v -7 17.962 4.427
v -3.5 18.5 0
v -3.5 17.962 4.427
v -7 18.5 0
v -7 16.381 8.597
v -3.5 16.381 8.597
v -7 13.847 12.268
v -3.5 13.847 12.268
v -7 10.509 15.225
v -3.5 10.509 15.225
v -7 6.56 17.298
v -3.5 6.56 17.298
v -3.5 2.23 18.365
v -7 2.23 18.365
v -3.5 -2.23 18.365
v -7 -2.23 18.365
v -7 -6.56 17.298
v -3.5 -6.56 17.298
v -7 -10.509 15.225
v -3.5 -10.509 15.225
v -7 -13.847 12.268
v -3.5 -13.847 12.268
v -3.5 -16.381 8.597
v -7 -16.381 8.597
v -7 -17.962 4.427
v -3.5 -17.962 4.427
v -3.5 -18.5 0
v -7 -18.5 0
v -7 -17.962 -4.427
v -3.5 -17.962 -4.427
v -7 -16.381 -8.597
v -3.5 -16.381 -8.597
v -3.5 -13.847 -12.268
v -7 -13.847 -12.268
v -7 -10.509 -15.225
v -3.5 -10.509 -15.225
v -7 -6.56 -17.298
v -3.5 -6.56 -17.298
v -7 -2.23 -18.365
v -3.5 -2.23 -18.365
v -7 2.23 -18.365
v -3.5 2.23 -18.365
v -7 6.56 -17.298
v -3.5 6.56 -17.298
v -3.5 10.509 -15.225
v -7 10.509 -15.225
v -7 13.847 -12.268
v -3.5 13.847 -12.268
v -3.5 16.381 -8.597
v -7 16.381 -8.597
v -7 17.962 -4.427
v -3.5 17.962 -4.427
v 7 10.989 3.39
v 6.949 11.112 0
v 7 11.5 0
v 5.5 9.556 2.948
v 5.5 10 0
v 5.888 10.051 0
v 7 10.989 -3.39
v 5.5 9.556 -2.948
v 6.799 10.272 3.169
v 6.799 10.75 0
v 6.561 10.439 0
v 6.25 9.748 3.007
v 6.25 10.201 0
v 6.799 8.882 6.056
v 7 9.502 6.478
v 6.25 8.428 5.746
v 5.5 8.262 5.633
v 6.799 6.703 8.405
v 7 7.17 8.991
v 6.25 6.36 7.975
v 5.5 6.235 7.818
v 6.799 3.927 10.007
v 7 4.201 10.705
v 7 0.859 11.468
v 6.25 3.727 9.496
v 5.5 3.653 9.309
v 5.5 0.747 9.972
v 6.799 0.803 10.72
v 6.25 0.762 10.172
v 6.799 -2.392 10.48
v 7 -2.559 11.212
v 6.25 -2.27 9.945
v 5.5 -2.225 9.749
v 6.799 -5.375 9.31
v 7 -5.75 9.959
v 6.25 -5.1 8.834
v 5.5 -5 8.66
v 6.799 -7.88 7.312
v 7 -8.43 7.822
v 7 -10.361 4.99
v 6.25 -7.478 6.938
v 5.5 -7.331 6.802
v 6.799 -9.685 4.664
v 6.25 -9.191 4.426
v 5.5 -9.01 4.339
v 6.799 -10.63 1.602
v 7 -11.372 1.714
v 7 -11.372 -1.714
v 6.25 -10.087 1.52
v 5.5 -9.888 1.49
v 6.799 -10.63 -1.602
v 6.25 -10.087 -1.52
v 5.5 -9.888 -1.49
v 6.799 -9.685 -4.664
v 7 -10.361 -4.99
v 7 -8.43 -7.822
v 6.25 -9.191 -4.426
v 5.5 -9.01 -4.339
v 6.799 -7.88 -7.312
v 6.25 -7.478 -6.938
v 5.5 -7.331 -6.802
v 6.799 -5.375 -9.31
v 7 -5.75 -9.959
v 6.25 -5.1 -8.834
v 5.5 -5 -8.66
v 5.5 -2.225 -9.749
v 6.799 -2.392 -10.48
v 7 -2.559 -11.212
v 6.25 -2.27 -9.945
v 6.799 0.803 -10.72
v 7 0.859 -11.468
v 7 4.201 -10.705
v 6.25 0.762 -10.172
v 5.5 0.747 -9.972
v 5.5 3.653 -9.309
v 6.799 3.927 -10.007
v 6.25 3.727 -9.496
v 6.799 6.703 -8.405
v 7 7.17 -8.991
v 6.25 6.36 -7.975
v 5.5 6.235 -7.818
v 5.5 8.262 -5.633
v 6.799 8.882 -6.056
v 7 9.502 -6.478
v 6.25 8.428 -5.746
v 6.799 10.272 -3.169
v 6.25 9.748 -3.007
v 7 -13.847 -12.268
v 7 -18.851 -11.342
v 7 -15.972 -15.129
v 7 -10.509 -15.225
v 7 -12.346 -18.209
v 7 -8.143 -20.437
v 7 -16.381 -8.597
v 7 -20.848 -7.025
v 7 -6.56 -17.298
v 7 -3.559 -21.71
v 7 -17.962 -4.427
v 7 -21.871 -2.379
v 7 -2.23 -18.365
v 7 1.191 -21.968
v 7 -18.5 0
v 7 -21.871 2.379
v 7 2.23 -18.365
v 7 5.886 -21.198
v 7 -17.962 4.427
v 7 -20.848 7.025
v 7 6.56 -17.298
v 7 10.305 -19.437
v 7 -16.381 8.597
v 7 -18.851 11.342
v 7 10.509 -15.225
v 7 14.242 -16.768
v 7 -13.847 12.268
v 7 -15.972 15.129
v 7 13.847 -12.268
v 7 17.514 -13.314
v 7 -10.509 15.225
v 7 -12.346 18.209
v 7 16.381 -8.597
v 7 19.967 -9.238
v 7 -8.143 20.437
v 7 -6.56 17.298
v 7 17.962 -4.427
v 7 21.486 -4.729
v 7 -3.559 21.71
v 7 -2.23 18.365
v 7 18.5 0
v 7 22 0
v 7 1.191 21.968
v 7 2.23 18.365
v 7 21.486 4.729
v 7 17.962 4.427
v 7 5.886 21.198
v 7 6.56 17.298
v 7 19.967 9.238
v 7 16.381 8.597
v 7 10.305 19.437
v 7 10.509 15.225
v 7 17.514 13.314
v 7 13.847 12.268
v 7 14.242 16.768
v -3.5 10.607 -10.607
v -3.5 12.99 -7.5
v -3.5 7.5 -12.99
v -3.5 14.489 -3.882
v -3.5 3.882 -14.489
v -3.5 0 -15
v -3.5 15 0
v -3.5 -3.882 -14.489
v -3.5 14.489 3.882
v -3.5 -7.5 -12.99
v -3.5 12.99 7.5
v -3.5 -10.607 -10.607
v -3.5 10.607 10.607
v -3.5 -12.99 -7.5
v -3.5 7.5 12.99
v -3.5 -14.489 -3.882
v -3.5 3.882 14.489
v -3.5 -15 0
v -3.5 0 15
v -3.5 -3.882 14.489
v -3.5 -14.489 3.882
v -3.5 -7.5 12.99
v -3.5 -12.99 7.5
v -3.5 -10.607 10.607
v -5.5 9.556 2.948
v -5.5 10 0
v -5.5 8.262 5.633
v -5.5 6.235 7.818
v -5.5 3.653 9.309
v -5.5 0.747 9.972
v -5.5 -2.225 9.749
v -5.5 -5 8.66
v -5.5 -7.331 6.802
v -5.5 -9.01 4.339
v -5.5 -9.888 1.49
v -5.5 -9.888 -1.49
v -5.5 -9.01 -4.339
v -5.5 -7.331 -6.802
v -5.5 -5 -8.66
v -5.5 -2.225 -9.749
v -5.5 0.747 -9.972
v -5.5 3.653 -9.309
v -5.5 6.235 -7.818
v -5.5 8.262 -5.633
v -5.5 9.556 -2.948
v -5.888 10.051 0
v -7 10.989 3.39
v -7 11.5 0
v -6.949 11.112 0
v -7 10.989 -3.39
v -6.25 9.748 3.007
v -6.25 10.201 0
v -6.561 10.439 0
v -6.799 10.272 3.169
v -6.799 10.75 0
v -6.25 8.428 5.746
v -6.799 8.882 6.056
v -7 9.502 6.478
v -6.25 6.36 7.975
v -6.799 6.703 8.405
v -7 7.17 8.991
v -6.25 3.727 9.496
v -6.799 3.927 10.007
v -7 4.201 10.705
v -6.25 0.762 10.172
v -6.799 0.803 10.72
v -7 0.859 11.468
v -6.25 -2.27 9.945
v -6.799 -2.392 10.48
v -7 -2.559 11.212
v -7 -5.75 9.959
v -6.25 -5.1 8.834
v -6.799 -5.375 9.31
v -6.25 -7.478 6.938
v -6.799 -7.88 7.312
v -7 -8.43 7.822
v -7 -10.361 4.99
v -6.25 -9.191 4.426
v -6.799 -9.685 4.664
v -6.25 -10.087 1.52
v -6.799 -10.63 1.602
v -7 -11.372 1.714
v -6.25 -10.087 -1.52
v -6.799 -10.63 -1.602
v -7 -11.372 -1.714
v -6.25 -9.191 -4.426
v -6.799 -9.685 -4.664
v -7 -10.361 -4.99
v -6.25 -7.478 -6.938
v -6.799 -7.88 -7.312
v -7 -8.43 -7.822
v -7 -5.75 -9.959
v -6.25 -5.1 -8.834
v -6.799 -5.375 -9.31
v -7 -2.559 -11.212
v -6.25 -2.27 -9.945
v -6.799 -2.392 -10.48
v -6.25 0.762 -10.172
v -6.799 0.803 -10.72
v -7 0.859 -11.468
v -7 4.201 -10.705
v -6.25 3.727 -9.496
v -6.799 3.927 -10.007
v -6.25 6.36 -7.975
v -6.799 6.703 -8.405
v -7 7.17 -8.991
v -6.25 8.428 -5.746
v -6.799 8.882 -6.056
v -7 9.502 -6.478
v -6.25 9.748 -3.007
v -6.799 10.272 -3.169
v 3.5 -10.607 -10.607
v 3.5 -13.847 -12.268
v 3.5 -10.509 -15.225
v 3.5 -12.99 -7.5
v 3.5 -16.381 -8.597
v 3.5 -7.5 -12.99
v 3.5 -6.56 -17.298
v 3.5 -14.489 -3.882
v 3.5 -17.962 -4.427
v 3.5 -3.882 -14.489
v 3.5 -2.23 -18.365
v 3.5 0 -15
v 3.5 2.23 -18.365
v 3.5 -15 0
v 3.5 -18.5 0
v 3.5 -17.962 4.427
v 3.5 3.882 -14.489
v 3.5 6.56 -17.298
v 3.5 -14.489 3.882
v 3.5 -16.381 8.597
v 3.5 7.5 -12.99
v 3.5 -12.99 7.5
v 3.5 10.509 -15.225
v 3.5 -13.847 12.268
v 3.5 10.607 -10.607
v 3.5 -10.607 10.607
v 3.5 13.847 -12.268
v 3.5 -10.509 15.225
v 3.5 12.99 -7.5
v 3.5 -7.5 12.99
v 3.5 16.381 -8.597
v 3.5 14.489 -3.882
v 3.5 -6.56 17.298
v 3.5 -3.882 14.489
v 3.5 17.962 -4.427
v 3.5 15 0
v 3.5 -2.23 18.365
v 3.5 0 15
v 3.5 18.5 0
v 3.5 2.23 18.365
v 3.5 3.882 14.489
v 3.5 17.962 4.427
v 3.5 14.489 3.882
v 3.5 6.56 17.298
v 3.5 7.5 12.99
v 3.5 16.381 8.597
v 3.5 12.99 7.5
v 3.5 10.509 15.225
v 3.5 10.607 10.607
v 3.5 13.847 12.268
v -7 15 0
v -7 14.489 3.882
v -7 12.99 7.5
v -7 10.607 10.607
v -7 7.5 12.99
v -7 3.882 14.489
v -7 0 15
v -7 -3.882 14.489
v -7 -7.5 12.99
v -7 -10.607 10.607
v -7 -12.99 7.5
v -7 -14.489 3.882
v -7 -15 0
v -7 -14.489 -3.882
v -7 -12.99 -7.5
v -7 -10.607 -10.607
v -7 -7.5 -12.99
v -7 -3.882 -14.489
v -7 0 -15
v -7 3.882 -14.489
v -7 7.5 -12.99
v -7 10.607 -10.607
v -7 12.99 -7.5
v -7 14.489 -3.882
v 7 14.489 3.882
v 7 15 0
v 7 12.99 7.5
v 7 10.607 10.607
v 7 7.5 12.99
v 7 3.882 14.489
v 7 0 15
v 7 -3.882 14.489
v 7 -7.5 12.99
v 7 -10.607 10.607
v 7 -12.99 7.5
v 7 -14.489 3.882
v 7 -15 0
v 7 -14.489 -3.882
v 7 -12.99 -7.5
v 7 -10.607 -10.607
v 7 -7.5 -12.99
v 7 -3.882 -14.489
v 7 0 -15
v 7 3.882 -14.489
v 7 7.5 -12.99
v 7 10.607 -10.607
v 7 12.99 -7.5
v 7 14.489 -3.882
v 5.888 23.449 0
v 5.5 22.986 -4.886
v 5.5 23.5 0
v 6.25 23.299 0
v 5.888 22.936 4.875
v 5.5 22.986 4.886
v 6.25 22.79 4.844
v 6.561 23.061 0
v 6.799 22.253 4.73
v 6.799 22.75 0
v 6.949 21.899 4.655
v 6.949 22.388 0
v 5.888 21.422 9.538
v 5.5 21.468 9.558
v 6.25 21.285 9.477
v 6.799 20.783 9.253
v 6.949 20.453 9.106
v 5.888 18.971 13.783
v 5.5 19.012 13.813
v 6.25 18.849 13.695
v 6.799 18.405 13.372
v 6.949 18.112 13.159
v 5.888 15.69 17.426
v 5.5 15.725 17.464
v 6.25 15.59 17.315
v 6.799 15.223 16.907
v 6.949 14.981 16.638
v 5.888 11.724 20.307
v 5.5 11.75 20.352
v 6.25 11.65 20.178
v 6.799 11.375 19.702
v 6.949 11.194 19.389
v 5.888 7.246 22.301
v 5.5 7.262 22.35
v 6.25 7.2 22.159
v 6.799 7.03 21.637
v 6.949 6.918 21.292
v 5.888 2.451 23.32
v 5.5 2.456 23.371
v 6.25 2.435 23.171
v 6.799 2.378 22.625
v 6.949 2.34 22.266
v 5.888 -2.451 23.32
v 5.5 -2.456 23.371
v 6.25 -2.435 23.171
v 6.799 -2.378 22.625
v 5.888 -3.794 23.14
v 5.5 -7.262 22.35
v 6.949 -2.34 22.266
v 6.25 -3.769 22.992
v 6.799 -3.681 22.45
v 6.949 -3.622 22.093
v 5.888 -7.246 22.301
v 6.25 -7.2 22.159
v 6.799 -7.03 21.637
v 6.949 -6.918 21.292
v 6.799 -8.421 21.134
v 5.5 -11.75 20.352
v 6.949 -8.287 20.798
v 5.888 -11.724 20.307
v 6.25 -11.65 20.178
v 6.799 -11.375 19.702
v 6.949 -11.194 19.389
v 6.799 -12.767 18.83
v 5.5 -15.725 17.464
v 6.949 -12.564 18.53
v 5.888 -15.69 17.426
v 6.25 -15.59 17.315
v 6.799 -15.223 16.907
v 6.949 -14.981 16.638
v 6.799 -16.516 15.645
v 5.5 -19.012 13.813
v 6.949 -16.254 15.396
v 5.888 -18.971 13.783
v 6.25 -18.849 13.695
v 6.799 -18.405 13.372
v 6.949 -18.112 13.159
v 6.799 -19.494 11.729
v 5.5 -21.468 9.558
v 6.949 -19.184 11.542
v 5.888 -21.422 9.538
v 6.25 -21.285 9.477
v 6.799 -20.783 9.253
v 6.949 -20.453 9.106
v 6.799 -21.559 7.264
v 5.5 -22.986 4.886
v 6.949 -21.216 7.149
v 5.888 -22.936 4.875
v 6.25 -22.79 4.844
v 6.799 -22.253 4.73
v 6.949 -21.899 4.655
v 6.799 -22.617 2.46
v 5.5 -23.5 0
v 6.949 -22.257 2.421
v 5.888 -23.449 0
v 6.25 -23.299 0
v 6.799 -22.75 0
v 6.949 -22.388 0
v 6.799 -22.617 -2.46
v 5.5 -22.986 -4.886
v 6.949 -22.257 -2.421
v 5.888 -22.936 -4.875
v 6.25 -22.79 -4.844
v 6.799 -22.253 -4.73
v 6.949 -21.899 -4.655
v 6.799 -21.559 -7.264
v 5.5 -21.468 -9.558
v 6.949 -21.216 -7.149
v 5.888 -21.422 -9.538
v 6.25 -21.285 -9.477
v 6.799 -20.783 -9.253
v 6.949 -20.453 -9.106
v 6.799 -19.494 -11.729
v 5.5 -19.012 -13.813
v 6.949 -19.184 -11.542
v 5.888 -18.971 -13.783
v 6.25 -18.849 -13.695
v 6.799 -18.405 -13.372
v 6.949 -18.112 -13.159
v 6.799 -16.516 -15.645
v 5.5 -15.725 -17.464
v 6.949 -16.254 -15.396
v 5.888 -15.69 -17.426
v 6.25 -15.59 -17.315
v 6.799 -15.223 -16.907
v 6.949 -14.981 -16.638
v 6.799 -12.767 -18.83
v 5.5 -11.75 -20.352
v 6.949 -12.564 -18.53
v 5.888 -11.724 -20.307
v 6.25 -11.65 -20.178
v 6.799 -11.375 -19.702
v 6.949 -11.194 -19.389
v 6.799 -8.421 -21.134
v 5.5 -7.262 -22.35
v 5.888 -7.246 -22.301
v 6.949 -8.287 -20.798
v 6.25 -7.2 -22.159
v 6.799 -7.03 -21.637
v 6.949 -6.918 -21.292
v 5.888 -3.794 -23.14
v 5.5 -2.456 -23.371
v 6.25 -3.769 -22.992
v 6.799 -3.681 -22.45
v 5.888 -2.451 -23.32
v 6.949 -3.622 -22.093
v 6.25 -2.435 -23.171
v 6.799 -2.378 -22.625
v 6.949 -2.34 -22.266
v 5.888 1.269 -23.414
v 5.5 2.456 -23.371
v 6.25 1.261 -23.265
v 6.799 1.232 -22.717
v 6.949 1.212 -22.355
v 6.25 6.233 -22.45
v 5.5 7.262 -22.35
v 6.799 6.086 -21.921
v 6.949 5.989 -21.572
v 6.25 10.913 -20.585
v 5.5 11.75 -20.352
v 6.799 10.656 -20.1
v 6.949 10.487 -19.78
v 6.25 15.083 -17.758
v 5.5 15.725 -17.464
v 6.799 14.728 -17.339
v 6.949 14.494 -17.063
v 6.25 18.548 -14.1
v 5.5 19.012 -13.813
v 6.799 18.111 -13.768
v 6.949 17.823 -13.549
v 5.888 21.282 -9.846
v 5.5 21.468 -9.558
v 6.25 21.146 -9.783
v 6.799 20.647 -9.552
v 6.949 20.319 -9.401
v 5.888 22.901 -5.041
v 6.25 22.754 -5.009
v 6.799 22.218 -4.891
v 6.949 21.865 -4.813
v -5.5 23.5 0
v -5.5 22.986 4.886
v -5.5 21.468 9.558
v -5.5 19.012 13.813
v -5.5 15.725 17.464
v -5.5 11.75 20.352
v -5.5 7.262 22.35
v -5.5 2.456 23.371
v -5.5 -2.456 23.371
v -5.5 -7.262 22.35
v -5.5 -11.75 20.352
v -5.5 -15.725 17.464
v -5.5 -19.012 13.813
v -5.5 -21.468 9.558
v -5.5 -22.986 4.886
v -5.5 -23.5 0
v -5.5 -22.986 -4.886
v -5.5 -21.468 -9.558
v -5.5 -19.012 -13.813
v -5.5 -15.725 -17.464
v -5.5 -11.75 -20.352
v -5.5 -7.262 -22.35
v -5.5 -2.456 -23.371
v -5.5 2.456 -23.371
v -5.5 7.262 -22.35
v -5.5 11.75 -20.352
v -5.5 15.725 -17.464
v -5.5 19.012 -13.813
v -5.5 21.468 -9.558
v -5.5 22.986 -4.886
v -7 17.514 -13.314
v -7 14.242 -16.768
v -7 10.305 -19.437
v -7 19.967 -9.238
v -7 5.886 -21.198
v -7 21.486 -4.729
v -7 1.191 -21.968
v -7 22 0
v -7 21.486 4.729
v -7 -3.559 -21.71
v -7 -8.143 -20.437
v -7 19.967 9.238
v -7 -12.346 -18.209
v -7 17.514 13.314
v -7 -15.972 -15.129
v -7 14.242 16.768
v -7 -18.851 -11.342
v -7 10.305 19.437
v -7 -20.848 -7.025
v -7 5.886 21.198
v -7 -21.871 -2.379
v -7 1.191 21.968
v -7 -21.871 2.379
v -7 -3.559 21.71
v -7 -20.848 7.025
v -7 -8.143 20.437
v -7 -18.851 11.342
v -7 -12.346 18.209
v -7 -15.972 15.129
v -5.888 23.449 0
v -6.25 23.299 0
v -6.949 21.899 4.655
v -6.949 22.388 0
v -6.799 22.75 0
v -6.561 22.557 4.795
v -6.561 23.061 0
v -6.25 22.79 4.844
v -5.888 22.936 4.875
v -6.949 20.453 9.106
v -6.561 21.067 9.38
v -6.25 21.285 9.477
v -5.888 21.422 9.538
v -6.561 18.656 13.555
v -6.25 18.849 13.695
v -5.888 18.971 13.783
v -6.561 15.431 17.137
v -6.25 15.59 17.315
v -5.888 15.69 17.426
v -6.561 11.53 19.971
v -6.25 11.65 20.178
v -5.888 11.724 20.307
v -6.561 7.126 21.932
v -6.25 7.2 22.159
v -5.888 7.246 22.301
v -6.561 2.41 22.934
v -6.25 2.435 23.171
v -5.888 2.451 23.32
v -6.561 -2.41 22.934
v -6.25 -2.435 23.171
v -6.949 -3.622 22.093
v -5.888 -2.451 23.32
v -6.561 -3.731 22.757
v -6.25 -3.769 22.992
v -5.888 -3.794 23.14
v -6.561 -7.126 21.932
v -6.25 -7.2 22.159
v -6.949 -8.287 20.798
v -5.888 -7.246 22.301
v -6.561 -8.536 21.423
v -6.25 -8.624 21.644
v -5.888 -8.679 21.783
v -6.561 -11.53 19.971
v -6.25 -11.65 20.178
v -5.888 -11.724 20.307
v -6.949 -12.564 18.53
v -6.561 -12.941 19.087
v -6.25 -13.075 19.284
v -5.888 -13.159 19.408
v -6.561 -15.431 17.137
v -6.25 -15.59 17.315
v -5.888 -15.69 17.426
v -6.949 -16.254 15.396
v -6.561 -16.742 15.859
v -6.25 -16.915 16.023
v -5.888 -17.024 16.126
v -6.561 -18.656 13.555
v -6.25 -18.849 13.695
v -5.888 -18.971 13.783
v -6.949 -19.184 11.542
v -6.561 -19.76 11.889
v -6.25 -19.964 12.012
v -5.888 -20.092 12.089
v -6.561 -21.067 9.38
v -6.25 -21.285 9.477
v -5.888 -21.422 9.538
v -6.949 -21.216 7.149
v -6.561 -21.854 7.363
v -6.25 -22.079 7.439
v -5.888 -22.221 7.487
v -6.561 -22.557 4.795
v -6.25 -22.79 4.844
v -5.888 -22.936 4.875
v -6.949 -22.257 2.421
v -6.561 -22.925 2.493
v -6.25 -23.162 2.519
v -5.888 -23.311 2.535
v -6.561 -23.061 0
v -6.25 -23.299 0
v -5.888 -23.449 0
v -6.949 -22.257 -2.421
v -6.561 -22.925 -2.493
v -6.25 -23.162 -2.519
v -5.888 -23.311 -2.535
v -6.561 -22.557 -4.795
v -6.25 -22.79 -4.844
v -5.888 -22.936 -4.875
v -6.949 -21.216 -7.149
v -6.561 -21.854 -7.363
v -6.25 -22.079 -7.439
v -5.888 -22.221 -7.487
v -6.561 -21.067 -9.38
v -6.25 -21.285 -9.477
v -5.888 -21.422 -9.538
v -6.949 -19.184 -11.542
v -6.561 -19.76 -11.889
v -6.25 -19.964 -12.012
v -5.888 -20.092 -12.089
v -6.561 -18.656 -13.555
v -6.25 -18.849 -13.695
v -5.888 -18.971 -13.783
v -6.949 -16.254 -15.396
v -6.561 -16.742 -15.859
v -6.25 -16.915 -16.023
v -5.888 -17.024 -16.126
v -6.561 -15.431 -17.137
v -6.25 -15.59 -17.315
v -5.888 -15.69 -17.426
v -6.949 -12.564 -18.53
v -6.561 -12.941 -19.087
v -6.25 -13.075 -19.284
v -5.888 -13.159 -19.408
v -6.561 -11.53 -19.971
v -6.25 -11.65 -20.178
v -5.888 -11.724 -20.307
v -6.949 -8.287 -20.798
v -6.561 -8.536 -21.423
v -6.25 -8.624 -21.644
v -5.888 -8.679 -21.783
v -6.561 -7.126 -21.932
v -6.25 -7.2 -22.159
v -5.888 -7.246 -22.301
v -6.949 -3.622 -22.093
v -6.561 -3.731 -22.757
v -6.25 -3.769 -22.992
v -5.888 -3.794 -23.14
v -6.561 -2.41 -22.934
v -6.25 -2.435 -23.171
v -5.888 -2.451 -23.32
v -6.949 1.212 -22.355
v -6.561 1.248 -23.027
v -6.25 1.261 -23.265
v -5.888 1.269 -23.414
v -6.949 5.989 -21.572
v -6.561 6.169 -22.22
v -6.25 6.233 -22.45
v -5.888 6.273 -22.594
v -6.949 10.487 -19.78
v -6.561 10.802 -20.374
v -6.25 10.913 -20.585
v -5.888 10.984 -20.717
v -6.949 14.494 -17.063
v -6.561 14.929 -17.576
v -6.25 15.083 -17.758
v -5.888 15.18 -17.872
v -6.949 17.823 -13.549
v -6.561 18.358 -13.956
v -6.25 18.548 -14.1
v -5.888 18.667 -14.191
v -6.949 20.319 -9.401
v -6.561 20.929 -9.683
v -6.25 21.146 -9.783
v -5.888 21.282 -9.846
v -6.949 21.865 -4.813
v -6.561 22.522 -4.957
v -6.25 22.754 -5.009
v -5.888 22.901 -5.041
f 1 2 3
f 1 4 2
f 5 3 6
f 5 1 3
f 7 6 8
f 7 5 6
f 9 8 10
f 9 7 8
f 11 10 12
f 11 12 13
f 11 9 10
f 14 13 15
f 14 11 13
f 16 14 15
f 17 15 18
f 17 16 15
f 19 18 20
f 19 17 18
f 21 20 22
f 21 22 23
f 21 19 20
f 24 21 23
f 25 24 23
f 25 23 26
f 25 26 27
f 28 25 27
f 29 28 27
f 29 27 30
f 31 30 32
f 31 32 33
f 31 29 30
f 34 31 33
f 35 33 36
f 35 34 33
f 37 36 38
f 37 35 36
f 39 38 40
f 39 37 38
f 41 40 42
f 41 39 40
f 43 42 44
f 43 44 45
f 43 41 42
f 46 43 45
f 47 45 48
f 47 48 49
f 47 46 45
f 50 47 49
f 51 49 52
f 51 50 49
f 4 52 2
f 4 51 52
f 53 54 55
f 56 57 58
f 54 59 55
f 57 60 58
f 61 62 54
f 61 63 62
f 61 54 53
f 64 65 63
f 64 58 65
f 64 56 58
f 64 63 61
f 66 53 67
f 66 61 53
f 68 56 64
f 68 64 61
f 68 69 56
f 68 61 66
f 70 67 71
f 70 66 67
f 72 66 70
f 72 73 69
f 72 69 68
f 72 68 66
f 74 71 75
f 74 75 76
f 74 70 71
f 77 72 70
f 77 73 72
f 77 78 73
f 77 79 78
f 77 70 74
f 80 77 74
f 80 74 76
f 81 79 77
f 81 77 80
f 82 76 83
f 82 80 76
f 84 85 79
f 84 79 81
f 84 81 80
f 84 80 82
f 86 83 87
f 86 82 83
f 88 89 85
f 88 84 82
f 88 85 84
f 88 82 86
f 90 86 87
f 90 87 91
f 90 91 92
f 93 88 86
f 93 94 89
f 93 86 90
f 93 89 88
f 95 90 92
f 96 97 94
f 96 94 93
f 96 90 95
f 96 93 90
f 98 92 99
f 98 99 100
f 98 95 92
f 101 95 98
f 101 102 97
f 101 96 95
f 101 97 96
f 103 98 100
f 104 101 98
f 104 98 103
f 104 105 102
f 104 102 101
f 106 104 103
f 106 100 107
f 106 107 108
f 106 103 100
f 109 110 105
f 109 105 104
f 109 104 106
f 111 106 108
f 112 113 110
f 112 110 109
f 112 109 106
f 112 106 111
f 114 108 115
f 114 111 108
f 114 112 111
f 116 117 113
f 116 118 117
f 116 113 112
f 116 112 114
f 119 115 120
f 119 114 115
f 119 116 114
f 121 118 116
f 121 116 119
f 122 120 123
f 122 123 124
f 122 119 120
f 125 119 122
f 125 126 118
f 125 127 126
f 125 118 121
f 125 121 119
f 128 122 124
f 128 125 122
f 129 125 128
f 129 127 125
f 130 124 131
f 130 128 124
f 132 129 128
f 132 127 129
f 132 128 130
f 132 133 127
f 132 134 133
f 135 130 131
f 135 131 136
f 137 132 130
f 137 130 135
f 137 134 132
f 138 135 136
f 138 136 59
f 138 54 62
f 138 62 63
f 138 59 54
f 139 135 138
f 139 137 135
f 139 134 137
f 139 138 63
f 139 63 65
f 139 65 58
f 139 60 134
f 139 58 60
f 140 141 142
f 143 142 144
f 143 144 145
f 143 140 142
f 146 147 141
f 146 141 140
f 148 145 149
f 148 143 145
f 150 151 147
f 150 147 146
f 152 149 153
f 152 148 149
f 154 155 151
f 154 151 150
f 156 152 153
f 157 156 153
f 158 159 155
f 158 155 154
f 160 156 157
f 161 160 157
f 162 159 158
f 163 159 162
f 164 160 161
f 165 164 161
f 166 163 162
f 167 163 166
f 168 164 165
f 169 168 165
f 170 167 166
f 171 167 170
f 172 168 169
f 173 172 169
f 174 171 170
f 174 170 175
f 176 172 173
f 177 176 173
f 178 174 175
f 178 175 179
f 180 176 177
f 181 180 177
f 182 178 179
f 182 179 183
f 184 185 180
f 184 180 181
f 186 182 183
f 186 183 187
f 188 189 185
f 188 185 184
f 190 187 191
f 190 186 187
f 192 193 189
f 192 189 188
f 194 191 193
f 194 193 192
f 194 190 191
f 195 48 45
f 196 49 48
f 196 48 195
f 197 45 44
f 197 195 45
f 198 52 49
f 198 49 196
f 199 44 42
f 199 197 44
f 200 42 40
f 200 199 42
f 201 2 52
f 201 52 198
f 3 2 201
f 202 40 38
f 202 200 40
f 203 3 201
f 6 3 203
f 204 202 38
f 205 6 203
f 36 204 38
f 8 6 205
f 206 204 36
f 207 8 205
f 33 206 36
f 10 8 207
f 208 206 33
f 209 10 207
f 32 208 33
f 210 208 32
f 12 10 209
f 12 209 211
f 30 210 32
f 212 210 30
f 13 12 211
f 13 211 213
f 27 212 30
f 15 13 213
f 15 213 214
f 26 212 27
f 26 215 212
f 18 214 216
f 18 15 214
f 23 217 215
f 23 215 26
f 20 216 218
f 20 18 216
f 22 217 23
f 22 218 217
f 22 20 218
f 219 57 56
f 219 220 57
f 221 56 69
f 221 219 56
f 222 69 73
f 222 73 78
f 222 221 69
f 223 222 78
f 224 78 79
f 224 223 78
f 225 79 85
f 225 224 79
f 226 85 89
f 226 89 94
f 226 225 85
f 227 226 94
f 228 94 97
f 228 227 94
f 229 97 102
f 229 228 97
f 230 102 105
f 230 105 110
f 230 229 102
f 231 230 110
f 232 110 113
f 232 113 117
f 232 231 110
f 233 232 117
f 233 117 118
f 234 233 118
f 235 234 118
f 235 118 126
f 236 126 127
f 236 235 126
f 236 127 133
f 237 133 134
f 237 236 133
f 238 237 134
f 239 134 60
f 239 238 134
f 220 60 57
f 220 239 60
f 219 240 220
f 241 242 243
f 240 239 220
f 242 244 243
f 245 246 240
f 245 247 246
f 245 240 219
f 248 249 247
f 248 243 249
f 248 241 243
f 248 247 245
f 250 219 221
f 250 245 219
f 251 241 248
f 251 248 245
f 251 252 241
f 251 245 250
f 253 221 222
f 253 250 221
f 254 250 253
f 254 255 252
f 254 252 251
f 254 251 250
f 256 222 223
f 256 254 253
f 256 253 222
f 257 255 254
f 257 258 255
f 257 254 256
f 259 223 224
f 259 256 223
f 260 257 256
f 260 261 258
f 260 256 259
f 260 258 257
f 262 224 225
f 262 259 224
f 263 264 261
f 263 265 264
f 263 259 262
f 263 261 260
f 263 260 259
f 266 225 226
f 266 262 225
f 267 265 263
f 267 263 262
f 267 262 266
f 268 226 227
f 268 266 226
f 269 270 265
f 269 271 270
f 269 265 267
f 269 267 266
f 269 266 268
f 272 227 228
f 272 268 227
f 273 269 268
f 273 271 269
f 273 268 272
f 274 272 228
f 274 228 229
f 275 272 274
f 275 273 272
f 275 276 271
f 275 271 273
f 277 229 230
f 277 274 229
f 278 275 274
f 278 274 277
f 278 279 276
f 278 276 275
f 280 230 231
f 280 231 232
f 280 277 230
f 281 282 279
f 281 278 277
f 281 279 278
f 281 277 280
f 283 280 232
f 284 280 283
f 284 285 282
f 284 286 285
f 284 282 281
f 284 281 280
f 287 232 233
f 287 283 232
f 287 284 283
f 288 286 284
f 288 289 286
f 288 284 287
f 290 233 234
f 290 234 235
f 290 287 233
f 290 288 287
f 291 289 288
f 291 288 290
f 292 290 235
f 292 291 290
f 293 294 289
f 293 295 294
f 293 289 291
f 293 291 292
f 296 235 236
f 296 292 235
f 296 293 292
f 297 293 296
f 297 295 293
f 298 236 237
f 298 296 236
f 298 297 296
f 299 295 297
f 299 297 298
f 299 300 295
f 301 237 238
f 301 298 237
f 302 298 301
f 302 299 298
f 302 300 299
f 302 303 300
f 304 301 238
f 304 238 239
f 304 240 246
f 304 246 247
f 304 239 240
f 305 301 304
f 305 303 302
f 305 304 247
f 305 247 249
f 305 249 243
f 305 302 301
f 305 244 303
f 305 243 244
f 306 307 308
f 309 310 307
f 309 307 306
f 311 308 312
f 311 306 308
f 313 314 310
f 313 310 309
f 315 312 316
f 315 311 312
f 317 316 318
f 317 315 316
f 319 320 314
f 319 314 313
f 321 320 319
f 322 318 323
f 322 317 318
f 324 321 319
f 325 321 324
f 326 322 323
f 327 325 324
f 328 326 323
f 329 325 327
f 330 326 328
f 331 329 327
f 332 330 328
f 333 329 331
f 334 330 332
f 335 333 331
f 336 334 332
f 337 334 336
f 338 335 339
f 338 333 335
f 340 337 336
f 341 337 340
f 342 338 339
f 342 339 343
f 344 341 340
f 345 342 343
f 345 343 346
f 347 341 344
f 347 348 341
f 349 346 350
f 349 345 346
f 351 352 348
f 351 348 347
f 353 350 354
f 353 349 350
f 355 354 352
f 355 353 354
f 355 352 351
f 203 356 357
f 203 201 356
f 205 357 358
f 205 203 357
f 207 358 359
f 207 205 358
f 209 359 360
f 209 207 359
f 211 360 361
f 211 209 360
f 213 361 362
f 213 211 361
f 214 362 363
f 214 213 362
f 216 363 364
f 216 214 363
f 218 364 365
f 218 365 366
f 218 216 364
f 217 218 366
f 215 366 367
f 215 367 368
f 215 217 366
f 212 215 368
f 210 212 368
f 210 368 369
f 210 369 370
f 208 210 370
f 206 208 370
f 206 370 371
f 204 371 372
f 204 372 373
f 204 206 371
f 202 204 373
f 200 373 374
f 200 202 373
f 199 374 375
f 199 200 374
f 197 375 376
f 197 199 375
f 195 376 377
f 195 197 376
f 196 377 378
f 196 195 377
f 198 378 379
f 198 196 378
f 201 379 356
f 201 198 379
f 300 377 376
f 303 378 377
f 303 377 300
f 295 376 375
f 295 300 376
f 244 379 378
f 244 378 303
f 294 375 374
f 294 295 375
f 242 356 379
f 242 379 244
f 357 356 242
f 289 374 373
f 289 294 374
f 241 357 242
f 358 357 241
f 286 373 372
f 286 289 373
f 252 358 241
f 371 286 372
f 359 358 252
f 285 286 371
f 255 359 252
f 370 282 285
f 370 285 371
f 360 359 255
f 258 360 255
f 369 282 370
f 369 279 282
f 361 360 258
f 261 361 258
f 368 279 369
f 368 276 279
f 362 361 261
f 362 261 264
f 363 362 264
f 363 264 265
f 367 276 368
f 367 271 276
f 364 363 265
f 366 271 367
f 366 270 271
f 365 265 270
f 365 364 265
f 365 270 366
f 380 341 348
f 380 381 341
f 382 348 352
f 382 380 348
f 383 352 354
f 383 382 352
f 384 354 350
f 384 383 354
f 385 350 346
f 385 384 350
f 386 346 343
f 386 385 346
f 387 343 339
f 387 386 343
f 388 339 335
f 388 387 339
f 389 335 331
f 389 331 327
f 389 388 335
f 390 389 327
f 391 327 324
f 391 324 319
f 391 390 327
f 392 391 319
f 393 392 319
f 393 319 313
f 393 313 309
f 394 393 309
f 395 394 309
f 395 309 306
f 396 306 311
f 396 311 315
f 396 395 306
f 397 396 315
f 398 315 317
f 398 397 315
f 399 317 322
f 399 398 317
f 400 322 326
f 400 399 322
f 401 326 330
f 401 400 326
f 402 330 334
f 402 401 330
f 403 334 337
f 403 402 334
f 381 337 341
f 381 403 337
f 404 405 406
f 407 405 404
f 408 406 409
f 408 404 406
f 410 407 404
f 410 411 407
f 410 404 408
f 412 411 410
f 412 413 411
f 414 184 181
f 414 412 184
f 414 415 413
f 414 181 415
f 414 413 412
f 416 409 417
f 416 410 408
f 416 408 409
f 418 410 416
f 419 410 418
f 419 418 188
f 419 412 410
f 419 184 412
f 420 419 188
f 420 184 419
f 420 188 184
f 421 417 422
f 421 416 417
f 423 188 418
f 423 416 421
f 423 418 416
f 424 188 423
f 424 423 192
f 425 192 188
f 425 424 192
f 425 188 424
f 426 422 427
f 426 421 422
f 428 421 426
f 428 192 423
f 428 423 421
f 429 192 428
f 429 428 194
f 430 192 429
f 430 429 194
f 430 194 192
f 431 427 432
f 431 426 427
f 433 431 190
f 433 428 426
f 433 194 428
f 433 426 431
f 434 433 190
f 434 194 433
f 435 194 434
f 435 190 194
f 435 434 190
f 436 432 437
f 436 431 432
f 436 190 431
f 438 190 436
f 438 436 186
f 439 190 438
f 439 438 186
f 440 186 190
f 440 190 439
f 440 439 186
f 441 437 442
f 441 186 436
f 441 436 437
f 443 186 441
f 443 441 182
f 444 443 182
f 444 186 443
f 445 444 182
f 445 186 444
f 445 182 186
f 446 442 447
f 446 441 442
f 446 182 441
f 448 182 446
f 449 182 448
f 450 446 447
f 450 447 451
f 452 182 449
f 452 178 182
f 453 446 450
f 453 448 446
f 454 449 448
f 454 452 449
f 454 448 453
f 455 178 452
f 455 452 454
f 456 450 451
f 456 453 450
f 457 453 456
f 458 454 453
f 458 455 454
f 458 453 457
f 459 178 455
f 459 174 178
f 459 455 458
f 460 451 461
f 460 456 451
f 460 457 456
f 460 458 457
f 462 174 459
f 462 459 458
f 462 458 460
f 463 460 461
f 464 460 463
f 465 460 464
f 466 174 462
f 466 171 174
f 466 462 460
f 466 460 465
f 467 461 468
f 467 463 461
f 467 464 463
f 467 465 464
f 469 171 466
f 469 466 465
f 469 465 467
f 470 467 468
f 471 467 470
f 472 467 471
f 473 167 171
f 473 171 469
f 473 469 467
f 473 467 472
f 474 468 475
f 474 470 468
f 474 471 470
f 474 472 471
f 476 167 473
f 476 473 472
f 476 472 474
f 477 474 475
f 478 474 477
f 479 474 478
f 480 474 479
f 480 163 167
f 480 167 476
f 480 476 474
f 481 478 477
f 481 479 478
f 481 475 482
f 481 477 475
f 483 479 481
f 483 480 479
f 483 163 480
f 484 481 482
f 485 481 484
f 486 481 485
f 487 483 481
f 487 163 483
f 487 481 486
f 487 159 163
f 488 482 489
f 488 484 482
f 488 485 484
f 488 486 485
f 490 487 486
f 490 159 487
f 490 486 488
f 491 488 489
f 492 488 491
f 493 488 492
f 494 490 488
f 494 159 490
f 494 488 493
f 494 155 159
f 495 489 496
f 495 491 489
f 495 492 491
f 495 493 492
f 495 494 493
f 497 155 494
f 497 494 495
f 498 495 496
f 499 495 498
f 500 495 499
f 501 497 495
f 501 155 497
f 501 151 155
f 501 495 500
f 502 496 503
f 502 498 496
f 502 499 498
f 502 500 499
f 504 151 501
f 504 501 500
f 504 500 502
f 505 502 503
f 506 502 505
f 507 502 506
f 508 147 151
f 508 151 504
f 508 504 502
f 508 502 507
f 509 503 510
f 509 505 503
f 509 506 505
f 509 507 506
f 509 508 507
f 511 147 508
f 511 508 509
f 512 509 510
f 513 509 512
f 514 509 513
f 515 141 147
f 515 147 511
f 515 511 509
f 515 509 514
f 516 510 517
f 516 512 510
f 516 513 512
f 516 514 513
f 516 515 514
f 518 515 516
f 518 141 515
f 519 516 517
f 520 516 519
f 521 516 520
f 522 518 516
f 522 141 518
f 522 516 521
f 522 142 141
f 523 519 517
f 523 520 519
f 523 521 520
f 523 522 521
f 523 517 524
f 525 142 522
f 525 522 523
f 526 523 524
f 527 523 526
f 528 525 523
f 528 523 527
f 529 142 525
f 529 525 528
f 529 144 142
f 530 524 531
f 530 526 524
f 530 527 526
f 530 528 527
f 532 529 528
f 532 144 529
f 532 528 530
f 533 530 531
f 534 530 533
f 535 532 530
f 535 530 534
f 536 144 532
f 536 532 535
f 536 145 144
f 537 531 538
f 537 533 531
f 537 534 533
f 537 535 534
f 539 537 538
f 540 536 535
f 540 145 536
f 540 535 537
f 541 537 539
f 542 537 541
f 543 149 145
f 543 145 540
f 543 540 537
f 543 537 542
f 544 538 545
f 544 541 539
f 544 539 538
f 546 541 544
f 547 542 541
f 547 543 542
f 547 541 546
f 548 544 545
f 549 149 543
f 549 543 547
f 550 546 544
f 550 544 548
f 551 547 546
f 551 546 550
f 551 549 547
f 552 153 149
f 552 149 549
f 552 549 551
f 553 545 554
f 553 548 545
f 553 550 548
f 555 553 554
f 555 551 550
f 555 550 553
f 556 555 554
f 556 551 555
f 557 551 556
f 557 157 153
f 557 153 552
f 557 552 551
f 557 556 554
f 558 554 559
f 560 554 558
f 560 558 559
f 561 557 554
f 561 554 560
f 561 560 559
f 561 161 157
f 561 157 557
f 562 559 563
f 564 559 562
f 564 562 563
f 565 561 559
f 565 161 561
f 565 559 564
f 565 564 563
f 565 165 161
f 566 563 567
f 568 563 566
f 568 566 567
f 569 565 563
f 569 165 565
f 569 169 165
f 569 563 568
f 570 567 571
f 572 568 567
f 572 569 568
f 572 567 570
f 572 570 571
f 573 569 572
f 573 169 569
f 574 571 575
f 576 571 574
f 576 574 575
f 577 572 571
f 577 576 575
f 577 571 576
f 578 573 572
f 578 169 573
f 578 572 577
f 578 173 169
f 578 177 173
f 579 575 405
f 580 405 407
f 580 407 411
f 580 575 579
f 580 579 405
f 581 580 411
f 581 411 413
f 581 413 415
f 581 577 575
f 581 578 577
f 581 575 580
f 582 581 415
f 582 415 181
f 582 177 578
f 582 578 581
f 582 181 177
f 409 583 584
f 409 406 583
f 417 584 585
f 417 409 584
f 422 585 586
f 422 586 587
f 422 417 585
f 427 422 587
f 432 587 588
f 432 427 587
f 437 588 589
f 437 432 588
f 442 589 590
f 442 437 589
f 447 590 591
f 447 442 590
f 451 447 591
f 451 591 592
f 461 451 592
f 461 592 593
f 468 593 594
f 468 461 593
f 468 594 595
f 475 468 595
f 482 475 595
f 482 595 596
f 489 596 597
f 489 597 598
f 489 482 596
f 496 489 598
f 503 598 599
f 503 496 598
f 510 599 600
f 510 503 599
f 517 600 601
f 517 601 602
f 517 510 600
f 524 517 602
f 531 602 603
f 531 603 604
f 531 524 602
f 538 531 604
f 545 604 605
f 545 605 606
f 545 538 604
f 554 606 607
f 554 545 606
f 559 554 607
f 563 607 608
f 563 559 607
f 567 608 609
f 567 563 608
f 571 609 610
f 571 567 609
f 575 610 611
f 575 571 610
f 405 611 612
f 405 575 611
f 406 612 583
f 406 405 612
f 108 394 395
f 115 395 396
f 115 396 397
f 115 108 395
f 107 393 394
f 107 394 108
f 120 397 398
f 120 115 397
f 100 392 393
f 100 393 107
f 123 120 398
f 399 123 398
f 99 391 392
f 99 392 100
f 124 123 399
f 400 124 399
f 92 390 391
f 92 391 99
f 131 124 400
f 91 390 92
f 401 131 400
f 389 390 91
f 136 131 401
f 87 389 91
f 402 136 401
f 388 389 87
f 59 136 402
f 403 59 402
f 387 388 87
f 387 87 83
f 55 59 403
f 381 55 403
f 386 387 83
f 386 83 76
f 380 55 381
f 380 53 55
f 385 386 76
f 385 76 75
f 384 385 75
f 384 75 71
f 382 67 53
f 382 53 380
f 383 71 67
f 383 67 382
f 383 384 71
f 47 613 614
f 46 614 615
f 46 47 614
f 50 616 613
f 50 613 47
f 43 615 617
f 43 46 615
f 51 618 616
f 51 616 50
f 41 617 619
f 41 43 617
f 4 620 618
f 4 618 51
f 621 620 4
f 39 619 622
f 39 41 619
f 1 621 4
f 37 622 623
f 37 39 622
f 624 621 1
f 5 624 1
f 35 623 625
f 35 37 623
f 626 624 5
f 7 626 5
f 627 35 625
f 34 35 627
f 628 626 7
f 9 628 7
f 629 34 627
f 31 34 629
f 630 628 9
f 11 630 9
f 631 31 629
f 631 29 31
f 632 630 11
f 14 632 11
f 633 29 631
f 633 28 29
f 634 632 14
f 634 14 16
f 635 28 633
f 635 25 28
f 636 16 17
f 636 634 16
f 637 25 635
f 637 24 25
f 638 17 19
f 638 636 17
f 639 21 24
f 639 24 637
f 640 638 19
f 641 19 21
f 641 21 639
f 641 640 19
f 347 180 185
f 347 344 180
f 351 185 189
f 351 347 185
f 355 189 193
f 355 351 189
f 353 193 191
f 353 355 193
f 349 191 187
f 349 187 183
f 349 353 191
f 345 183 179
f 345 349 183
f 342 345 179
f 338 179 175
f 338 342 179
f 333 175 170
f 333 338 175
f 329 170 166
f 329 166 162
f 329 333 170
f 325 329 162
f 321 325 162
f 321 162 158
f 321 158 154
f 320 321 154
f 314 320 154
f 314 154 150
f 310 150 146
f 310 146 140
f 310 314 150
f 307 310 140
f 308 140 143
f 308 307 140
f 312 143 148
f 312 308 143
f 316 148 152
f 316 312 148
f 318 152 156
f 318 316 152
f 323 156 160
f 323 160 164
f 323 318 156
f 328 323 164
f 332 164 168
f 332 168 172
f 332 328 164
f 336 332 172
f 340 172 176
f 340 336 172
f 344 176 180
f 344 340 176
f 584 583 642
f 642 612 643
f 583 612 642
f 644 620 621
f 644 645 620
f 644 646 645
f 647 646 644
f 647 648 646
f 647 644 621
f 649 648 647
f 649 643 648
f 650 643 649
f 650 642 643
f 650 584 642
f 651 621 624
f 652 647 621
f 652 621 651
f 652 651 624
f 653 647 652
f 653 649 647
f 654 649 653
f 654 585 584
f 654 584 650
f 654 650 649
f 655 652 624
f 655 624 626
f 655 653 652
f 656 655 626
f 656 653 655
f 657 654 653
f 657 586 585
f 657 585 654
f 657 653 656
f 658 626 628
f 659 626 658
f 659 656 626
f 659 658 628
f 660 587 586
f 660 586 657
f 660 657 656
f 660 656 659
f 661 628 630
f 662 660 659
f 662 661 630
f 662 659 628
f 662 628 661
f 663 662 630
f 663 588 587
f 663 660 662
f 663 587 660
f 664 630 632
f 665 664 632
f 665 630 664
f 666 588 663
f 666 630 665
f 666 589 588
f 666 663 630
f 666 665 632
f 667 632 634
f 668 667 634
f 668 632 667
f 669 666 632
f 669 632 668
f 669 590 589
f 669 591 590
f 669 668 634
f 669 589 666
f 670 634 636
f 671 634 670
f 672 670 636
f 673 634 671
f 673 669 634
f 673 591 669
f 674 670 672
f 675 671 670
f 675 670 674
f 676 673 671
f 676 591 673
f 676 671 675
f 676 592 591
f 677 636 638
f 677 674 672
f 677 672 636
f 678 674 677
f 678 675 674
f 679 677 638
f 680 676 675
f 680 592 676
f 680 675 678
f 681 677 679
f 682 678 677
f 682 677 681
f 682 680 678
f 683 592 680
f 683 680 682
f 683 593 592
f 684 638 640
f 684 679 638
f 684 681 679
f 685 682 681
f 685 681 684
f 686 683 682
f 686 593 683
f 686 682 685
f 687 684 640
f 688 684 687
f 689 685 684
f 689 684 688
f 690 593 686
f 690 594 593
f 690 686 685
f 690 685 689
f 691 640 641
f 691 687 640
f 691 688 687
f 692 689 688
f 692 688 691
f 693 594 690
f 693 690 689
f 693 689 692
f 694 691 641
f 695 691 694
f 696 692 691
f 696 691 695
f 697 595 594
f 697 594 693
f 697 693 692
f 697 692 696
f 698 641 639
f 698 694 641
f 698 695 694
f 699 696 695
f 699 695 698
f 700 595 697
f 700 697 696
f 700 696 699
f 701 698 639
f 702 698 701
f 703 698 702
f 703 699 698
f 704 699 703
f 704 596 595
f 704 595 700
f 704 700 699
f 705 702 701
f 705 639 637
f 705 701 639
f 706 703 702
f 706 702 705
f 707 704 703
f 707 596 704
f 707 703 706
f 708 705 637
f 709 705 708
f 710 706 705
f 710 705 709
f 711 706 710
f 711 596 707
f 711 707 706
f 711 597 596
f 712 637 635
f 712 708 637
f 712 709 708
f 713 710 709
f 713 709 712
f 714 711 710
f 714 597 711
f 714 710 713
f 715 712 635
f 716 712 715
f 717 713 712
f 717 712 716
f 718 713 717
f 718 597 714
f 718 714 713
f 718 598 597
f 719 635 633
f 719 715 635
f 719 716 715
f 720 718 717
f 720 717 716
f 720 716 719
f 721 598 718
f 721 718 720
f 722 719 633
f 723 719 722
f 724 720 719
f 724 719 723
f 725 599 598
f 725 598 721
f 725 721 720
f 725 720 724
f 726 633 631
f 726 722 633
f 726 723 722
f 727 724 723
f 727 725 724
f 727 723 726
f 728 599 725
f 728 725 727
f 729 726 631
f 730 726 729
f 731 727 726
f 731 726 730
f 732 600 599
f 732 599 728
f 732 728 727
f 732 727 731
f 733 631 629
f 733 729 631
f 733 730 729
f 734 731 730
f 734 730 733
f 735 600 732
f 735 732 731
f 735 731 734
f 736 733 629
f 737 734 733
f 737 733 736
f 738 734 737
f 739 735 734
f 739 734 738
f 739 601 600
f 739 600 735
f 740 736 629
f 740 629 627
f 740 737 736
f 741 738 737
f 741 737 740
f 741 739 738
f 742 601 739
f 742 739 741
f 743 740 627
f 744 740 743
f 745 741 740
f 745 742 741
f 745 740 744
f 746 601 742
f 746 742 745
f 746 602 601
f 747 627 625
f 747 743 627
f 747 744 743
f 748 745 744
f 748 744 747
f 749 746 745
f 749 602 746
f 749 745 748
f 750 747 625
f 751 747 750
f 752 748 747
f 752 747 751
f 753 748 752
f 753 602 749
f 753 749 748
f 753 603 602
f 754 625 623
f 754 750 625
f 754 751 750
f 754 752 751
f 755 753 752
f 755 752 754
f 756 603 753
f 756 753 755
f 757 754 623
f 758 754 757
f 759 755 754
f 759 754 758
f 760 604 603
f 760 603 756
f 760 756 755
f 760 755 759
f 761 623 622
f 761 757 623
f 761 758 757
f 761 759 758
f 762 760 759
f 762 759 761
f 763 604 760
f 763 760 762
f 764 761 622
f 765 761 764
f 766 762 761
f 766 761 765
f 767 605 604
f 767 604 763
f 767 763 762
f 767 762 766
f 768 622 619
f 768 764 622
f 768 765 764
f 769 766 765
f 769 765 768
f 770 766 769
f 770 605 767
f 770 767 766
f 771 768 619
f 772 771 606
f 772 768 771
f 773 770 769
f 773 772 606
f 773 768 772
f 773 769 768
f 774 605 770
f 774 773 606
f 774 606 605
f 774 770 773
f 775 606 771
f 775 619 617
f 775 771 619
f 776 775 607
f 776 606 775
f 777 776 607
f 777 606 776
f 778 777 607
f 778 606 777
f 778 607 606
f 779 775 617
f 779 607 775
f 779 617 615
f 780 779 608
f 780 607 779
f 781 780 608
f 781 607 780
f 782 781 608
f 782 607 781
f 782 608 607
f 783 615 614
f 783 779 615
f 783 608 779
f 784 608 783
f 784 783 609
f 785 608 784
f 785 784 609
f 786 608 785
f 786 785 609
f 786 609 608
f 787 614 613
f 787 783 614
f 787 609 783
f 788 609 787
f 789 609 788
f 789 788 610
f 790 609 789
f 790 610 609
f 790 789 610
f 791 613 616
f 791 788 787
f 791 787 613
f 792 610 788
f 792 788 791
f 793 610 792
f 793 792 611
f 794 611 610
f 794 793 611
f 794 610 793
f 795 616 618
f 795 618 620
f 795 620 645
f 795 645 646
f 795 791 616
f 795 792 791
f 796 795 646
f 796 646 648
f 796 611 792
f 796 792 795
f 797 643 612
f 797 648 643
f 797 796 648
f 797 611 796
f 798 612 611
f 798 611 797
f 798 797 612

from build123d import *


with BuildPart() as part:
    # Эскиз1 → Повернуть1 (revolve)
    with BuildSketch(Plane.XY):
        with BuildLine():
            Line((5.5, 10), (-5.5, 10))
            ThreePointArc((-5.5, 10), (-6.560660172, 10.439339828), (-7, 11.5))
            Line((-7, 11.5), (-7, 15))
            Line((-7, 15), (-3.5, 15))
            Line((-3.5, 15), (-3.5, 18.5))
            Line((-3.5, 18.5), (-7, 18.5))
            Line((-7, 18.5), (-7, 22))
            ThreePointArc((-7, 22), (-6.560660172, 23.060660172), (-5.5, 23.5))
            Line((-5.5, 23.5), (5.5, 23.5))
            ThreePointArc((5.5, 23.5), (6.560660172, 23.060660172), (7, 22))
            Line((7, 22), (7, 18.5))
            Line((7, 18.5), (3.5, 18.5))
            Line((3.5, 18.5), (3.5, 15))
            Line((3.5, 15), (7, 15))
            Line((7, 15), (7, 11.5))
            ThreePointArc((7, 11.5), (6.560660172, 10.439339828), (5.5, 10))
        make_face()
    revolve(axis=Axis((-873.991742101, 0, 0), (1, 0, 0)))


solid = part.part
